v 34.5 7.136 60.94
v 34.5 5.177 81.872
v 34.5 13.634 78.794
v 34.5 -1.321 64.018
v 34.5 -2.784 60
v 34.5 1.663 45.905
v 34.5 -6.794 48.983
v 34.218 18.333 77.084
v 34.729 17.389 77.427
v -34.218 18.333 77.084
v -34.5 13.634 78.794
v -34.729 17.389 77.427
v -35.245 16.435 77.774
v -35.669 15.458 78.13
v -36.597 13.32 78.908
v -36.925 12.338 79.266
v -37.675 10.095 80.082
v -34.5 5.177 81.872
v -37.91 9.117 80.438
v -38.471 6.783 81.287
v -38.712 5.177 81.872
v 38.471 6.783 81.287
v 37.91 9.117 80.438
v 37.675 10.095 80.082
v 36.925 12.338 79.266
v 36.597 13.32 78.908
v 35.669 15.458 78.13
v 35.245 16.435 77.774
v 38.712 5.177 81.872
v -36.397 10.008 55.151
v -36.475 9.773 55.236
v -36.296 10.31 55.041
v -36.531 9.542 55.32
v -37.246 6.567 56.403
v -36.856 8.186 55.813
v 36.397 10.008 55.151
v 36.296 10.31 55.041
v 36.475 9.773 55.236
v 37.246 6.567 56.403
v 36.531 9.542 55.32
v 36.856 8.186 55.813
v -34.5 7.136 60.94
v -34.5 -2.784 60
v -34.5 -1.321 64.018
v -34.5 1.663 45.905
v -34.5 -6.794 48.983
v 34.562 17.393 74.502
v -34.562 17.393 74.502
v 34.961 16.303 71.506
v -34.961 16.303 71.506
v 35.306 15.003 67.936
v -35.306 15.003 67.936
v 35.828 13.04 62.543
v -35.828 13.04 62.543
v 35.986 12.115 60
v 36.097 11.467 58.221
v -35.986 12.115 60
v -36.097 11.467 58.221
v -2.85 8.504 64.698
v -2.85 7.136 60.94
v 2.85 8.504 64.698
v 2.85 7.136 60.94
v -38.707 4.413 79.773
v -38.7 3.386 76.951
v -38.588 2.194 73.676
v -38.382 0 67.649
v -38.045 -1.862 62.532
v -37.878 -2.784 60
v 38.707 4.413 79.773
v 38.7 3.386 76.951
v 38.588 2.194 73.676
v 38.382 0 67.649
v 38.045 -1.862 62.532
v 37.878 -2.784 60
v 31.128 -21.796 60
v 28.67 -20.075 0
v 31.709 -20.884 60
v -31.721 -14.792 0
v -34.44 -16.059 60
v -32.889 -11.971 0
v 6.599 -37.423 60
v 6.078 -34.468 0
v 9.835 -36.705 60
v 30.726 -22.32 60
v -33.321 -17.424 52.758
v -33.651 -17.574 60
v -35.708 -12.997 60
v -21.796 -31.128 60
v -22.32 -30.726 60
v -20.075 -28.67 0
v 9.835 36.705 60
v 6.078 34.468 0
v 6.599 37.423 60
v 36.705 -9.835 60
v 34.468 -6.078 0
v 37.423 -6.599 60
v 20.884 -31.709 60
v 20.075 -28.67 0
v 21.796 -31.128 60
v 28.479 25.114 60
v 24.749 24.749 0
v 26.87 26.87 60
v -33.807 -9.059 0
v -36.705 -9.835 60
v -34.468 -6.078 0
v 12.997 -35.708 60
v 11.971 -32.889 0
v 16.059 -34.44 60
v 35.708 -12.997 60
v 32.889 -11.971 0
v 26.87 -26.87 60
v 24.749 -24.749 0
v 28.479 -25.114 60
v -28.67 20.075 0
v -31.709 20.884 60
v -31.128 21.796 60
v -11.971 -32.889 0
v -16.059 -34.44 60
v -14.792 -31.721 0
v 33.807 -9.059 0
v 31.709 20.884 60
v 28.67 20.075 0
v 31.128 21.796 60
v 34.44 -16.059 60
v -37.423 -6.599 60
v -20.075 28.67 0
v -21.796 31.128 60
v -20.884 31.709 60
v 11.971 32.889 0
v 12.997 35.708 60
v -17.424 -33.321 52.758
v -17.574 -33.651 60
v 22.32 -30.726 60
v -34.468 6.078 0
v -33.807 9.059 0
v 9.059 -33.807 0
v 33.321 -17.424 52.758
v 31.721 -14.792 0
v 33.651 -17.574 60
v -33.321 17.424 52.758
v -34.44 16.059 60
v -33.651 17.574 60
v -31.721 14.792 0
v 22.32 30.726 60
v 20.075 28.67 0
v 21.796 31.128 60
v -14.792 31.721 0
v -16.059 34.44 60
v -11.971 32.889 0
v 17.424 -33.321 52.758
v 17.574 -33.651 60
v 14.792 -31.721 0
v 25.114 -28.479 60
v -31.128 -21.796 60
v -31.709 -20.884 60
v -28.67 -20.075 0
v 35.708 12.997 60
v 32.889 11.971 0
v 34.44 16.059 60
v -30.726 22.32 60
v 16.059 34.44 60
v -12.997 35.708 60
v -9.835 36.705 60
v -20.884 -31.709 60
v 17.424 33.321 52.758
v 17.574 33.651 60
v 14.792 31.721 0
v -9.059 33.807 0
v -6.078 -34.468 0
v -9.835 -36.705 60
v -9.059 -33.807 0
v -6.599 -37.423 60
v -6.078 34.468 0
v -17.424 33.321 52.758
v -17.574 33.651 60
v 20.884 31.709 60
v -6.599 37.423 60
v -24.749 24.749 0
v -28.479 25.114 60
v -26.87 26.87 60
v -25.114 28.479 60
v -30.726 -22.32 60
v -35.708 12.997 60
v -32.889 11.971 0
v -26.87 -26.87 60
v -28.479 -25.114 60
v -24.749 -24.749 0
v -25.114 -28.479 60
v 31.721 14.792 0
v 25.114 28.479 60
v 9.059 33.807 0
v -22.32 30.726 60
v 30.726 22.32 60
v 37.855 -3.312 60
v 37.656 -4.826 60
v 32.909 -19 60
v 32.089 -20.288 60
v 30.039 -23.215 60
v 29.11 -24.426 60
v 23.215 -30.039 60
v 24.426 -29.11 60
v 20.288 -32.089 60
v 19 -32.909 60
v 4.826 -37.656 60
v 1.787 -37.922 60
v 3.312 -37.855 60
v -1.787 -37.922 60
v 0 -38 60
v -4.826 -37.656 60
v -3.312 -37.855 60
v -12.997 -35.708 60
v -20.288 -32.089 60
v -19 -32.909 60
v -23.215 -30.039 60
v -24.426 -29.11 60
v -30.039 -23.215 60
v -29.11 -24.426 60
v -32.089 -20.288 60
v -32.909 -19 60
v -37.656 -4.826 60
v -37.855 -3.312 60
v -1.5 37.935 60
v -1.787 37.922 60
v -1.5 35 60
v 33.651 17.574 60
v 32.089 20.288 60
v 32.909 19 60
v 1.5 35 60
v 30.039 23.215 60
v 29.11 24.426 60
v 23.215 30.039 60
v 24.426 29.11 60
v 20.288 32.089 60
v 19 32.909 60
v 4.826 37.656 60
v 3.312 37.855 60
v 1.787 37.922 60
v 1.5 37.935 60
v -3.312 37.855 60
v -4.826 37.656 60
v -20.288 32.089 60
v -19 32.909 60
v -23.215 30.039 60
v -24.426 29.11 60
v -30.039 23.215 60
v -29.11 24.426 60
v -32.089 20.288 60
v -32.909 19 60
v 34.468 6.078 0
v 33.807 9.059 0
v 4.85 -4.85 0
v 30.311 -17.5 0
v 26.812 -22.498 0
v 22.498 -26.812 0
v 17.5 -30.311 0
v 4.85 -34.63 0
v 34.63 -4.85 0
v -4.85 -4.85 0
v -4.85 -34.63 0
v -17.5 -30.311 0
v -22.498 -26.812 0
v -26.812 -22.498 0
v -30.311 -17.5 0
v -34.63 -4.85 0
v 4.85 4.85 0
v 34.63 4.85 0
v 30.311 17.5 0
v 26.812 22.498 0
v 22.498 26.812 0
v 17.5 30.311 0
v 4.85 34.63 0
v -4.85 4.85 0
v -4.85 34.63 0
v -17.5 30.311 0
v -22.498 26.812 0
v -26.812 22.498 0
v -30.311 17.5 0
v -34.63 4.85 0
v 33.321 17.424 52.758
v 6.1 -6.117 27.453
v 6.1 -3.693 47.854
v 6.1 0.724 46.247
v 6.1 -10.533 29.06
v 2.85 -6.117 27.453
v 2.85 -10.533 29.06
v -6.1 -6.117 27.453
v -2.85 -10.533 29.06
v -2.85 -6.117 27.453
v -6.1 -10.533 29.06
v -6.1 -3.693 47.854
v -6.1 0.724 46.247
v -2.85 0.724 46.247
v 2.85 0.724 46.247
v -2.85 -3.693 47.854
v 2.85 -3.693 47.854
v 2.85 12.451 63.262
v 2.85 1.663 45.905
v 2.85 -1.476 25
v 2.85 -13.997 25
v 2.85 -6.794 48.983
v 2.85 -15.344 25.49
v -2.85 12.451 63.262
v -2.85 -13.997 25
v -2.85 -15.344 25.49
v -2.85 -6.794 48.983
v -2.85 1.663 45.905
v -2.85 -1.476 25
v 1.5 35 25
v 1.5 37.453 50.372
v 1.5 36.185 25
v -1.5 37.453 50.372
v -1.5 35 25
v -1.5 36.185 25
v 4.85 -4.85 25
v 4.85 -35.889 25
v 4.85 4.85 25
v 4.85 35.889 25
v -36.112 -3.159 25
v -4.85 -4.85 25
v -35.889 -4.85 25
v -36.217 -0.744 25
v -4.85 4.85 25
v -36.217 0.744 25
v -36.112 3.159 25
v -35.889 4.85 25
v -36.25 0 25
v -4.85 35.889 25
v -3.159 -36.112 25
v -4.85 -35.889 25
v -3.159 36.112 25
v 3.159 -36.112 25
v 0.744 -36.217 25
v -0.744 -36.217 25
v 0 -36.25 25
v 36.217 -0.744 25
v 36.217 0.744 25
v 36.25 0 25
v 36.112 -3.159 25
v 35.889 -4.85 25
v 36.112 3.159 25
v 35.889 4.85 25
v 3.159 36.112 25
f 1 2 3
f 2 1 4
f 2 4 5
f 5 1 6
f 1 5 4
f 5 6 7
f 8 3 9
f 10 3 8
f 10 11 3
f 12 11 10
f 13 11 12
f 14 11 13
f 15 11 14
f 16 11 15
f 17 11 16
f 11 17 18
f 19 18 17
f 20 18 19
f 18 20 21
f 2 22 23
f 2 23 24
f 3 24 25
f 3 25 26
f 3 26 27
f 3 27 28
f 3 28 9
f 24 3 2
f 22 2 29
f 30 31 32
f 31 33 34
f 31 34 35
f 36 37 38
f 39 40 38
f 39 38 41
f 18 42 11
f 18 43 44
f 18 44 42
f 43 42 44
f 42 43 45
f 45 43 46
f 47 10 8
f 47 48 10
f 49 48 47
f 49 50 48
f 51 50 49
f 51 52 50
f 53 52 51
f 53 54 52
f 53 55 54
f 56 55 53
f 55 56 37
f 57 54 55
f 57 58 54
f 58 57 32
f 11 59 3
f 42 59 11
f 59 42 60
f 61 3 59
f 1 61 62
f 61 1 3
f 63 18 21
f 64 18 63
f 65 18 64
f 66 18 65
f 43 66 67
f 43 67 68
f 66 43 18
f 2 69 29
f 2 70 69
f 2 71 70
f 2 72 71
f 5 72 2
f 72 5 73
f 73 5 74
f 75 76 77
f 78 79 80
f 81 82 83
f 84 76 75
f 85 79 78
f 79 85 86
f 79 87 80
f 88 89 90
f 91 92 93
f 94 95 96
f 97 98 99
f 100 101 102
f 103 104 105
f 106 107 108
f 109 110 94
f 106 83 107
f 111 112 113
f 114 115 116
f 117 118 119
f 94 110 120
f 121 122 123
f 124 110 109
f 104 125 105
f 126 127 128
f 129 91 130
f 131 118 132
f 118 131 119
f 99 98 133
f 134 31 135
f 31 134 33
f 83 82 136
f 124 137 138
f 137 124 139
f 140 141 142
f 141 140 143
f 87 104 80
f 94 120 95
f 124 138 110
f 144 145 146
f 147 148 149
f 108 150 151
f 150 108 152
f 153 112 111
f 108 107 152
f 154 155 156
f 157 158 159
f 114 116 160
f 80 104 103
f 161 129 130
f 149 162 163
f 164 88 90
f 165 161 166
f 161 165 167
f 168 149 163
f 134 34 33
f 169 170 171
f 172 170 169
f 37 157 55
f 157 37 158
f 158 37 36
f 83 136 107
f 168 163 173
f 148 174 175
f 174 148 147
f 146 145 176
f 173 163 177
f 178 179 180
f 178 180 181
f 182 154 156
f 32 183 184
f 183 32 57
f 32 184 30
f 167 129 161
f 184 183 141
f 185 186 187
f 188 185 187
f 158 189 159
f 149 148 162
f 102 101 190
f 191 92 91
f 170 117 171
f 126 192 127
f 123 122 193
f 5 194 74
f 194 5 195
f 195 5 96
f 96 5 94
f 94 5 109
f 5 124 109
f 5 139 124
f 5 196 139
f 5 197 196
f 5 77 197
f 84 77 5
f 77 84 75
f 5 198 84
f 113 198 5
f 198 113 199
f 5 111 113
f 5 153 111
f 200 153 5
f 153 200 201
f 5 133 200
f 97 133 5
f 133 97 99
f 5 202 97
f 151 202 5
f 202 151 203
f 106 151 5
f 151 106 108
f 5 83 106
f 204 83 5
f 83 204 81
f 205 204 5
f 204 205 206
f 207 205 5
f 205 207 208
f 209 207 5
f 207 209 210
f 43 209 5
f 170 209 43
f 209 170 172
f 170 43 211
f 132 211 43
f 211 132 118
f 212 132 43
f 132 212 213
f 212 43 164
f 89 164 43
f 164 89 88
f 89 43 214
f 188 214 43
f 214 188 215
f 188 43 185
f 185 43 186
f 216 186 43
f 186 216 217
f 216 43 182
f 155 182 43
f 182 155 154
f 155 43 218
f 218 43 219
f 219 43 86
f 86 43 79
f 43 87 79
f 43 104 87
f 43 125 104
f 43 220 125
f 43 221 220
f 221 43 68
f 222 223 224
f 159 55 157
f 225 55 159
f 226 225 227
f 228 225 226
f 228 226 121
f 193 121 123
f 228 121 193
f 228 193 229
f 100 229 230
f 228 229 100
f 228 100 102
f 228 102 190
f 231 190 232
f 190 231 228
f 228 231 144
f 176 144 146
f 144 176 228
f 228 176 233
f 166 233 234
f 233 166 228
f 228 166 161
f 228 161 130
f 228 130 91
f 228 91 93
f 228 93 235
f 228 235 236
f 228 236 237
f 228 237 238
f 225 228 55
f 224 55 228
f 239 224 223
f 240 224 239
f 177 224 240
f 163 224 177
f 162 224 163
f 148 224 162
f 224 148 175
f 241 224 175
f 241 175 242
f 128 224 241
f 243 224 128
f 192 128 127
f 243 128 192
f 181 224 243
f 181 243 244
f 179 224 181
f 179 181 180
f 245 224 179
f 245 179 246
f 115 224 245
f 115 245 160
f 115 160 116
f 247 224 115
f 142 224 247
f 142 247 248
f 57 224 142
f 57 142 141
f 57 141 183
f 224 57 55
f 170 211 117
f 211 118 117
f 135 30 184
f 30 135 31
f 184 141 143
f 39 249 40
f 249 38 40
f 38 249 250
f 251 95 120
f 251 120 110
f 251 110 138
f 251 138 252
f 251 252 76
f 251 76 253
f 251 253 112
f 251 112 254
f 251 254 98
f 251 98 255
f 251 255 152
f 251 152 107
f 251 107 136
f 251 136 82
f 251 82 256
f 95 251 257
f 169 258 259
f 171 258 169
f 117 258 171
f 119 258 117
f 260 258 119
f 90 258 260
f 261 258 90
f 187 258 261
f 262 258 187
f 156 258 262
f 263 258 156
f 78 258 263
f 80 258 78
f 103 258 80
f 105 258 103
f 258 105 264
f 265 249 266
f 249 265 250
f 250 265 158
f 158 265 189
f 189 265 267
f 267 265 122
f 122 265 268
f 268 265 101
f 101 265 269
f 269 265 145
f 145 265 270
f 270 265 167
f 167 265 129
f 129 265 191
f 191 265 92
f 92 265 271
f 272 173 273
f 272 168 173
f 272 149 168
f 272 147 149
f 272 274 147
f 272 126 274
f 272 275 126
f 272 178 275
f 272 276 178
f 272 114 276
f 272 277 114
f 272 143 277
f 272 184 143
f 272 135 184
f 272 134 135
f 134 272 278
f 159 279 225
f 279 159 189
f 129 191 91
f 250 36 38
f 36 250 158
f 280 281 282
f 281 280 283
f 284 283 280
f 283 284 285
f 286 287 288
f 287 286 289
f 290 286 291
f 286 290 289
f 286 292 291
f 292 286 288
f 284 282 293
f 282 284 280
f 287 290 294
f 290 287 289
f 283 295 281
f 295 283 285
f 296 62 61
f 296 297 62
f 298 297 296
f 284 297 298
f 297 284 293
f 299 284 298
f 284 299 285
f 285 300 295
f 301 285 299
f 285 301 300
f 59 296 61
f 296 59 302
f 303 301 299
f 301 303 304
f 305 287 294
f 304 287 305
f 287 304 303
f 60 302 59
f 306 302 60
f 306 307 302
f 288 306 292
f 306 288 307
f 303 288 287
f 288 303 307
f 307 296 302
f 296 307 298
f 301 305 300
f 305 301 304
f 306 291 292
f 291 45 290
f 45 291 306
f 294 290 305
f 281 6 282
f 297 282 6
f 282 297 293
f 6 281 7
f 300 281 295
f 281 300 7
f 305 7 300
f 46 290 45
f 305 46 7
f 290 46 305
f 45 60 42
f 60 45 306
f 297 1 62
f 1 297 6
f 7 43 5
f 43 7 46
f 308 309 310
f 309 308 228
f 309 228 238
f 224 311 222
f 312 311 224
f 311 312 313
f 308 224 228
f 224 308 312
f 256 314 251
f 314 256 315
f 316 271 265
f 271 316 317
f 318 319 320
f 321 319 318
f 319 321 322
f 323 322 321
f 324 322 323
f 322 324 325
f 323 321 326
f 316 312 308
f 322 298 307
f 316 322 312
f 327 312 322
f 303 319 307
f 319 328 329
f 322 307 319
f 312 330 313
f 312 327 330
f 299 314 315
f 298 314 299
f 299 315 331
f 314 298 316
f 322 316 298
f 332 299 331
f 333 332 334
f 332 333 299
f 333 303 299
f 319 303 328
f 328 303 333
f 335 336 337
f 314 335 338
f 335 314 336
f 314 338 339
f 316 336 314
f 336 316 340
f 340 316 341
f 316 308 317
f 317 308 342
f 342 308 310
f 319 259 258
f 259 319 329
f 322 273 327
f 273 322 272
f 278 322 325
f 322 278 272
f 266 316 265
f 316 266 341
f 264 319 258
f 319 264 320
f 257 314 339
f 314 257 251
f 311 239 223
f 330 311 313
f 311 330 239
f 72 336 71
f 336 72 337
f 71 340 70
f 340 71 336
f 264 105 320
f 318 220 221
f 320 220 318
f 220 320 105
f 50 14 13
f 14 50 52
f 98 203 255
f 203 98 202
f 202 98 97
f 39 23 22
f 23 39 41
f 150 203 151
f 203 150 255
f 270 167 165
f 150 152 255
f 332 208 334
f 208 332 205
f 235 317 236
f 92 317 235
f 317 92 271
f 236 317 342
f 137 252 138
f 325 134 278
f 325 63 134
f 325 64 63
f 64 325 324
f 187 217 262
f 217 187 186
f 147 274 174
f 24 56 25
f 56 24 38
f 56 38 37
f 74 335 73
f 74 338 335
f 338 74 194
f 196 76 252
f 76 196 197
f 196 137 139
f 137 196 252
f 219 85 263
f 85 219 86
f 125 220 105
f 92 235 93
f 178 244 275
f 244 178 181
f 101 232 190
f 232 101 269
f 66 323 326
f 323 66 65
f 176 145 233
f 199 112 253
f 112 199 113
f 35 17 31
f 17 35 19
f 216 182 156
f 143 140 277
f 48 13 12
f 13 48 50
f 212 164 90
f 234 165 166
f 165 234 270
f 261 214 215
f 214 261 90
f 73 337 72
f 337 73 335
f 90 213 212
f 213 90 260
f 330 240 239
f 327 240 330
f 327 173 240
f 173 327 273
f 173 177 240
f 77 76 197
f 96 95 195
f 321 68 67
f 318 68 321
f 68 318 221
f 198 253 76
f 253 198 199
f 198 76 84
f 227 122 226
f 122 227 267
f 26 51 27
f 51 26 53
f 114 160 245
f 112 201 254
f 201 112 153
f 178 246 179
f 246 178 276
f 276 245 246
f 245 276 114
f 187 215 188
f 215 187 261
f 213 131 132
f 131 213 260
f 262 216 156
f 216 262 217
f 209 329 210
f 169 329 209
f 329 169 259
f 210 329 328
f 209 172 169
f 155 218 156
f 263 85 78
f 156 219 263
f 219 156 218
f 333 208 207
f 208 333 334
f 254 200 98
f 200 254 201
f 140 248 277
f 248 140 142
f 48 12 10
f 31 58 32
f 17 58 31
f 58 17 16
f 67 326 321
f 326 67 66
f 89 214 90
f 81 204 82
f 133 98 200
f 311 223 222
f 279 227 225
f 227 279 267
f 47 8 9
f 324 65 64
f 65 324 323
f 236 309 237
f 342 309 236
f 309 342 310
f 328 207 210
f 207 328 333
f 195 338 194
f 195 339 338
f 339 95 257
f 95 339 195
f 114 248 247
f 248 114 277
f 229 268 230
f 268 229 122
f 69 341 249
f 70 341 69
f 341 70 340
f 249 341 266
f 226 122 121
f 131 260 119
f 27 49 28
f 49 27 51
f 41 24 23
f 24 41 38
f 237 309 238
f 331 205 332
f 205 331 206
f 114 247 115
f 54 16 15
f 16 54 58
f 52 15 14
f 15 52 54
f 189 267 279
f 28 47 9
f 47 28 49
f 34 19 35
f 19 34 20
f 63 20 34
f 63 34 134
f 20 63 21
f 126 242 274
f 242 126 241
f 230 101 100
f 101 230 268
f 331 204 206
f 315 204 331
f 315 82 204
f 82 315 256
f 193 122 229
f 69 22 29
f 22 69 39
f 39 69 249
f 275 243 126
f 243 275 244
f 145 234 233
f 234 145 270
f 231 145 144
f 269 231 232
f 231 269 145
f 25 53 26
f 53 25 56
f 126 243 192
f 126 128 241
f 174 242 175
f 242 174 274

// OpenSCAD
/*

Customisable cup holder adapter for a phone

Originally designed for Toyota Yaris cup holder to fit a Samsung Galaxy S8

(c) Matthias Liffers 2018

Released under CC-BY 4.0 license

All dimensions in millimetres

Changelog:

v0.1
 * First release

v0.2
 * Added side walls to dock rest to stop phone falling over when not plugged in
 * Added plug offset for phones where the plug is not dead centre along the y axis
 * Removed roundess from top

v1.0
 * modularised code
 * a bit more friendly for Thingiverse Customizer

*/ 

/* [ Basics ] */

// Diameter of cup holder
holder_top_diameter = 76;
// Diamater of cup holder bottom
holder_bottom_diameter = 70;
// Height of cup holder
holder_height = 60;

// Phone width
phone_x = 69;
// Phone Depth
phone_y = 9;

// Angle at which the phone should lean back
dock_angle = 20;
// Depth at which phone should be inset into the holder
dock_z = 15;

/* [ Back rest ] */

// Add back rest
dock_rest = true;
// Phone back rest height
dock_rest_z = 20;
// Phone back rest width
dock_rest_x = phone_x;
// Phone back rest depth
dock_rest_y = 5;

/* [ Charge plug hole ] */

plug = true; // Add charge plug hole
// Width of charging plug
plug_x = 12.2;
// Depth of charging plug
plug_y = 4.7;
// Length of charging plug, minus the contacts
plug_z = 19;
// Distance of charging plug from front of phone
plug_offset = 3.3;

/* [ Cable routing channel ] */

// Add cable routing channel
cable = true;
// Width of cable routing channel
cable_x = 3;
// Depth of cable routing channel
cable_y = 3;

// Smoothness of all rounded edges. Use a low number for faster rendering, increase when performing final render
round_smoothness= 72;

cos_d_a = cos(dock_angle);
sin_d_a = sin(dock_angle);
tan_d_a = tan(dock_angle);

holder_top_radius = holder_top_diameter/2;
holder_bottom_radius = holder_bottom_diameter/2;
dock_drop = (sin_d_a * phone_y / 2) - (cos_d_a * dock_z / 2);
dock_height_add = tan_d_a * (phone_y / 2 + dock_rest_y);
gouge_height = holder_height - ((cos_d_a * plug_z) + (cos_d_a * dock_z) - (sin_d_a * (phone_y - plug_offset))) - 5;
rest_setback = (sin_d_a * dock_z / 2) + (cos_d_a * phone_y / 2);

difference() {
    difference() {
        union() {
            // Main body
            cylinder( h = holder_height, r1 = holder_bottom_radius, r2 = holder_top_radius, $fn=round_smoothness);
                // Dock rest
                if (dock_rest)
                    create_dock_rest();
        }
        // Phone inset
        translate([(0 - phone_x) / 2, 0, holder_height + dock_drop])
            rotate(a = (0 - dock_angle), v = [1, 0, 0])
                translate ([0, 0 - (phone_y / 2), 0 - (dock_z / 2)])
                    union() {
                        cube([phone_x, phone_y, dock_z + 1]);
                        if (plug) 
                            create_plug_hole();
                    }
        // Cable channel
        if (cable)
            create_cable_channel();
        // Bottom gouges
        translate([0 - (plug_y + 5) / 2, 0 - holder_top_radius, -1])
            cube([plug_y + 5, holder_top_diameter, gouge_height + 1]);
        translate([0 - holder_top_radius, 0 - (plug_y + 5) / 2, -1])
            cube([holder_top_diameter, plug_y + 5, gouge_height +1 ]);
    }
    // Trim entire cup holder down to just the radius and slice the top off the dock
    difference() {
        cylinder(h = holder_height + dock_rest_z * 2, r = holder_top_radius * 2, $fn = round_smoothness);
         cylinder(h = holder_height * 2, r1 = holder_bottom_radius, r2 = holder_top_radius + (holder_top_radius - holder_bottom_radius), $fn = round_smoothness);
    }
}

module create_dock_rest() {
    translate([0 - (dock_rest_x / 2), rest_setback, holder_height])
        rotate(a = (0 - dock_angle), v = [1, 0, 0])
            translate([0, 0, 0 - dock_height_add])
                union() {
                    cube([dock_rest_x, dock_rest_y, dock_rest_z + dock_height_add]);
                    translate([0 - dock_rest_y, 0 - phone_y, 0])
                        cube([dock_rest_y, phone_y + dock_rest_y, dock_rest_z + dock_height_add]);
                    translate([dock_rest_x, 0 - phone_y, 0])
                        cube([dock_rest_y, phone_y + dock_rest_y, dock_rest_z + dock_height_add]);
                }    
}

module create_cable_channel() {
    translate([0 - (cable_x / 2), holder_top_radius - cable_y, -1])
        cube([cable_x, cable_y, holder_height +2]);
}

module create_plug_hole() {
    translate([phone_x / 2 - plug_x / 2, plug_offset, 0 - plug_z - 1])
        union() {
            cube([plug_x, plug_y, plug_z + 2]);
            translate([plug_x/2 - plug_y/2 - 0.5, 0 - plug_offset, - 5])
                cube([plug_y + 1, plug_x + 1, plug_z + plug_z + 7]);
        }
}
